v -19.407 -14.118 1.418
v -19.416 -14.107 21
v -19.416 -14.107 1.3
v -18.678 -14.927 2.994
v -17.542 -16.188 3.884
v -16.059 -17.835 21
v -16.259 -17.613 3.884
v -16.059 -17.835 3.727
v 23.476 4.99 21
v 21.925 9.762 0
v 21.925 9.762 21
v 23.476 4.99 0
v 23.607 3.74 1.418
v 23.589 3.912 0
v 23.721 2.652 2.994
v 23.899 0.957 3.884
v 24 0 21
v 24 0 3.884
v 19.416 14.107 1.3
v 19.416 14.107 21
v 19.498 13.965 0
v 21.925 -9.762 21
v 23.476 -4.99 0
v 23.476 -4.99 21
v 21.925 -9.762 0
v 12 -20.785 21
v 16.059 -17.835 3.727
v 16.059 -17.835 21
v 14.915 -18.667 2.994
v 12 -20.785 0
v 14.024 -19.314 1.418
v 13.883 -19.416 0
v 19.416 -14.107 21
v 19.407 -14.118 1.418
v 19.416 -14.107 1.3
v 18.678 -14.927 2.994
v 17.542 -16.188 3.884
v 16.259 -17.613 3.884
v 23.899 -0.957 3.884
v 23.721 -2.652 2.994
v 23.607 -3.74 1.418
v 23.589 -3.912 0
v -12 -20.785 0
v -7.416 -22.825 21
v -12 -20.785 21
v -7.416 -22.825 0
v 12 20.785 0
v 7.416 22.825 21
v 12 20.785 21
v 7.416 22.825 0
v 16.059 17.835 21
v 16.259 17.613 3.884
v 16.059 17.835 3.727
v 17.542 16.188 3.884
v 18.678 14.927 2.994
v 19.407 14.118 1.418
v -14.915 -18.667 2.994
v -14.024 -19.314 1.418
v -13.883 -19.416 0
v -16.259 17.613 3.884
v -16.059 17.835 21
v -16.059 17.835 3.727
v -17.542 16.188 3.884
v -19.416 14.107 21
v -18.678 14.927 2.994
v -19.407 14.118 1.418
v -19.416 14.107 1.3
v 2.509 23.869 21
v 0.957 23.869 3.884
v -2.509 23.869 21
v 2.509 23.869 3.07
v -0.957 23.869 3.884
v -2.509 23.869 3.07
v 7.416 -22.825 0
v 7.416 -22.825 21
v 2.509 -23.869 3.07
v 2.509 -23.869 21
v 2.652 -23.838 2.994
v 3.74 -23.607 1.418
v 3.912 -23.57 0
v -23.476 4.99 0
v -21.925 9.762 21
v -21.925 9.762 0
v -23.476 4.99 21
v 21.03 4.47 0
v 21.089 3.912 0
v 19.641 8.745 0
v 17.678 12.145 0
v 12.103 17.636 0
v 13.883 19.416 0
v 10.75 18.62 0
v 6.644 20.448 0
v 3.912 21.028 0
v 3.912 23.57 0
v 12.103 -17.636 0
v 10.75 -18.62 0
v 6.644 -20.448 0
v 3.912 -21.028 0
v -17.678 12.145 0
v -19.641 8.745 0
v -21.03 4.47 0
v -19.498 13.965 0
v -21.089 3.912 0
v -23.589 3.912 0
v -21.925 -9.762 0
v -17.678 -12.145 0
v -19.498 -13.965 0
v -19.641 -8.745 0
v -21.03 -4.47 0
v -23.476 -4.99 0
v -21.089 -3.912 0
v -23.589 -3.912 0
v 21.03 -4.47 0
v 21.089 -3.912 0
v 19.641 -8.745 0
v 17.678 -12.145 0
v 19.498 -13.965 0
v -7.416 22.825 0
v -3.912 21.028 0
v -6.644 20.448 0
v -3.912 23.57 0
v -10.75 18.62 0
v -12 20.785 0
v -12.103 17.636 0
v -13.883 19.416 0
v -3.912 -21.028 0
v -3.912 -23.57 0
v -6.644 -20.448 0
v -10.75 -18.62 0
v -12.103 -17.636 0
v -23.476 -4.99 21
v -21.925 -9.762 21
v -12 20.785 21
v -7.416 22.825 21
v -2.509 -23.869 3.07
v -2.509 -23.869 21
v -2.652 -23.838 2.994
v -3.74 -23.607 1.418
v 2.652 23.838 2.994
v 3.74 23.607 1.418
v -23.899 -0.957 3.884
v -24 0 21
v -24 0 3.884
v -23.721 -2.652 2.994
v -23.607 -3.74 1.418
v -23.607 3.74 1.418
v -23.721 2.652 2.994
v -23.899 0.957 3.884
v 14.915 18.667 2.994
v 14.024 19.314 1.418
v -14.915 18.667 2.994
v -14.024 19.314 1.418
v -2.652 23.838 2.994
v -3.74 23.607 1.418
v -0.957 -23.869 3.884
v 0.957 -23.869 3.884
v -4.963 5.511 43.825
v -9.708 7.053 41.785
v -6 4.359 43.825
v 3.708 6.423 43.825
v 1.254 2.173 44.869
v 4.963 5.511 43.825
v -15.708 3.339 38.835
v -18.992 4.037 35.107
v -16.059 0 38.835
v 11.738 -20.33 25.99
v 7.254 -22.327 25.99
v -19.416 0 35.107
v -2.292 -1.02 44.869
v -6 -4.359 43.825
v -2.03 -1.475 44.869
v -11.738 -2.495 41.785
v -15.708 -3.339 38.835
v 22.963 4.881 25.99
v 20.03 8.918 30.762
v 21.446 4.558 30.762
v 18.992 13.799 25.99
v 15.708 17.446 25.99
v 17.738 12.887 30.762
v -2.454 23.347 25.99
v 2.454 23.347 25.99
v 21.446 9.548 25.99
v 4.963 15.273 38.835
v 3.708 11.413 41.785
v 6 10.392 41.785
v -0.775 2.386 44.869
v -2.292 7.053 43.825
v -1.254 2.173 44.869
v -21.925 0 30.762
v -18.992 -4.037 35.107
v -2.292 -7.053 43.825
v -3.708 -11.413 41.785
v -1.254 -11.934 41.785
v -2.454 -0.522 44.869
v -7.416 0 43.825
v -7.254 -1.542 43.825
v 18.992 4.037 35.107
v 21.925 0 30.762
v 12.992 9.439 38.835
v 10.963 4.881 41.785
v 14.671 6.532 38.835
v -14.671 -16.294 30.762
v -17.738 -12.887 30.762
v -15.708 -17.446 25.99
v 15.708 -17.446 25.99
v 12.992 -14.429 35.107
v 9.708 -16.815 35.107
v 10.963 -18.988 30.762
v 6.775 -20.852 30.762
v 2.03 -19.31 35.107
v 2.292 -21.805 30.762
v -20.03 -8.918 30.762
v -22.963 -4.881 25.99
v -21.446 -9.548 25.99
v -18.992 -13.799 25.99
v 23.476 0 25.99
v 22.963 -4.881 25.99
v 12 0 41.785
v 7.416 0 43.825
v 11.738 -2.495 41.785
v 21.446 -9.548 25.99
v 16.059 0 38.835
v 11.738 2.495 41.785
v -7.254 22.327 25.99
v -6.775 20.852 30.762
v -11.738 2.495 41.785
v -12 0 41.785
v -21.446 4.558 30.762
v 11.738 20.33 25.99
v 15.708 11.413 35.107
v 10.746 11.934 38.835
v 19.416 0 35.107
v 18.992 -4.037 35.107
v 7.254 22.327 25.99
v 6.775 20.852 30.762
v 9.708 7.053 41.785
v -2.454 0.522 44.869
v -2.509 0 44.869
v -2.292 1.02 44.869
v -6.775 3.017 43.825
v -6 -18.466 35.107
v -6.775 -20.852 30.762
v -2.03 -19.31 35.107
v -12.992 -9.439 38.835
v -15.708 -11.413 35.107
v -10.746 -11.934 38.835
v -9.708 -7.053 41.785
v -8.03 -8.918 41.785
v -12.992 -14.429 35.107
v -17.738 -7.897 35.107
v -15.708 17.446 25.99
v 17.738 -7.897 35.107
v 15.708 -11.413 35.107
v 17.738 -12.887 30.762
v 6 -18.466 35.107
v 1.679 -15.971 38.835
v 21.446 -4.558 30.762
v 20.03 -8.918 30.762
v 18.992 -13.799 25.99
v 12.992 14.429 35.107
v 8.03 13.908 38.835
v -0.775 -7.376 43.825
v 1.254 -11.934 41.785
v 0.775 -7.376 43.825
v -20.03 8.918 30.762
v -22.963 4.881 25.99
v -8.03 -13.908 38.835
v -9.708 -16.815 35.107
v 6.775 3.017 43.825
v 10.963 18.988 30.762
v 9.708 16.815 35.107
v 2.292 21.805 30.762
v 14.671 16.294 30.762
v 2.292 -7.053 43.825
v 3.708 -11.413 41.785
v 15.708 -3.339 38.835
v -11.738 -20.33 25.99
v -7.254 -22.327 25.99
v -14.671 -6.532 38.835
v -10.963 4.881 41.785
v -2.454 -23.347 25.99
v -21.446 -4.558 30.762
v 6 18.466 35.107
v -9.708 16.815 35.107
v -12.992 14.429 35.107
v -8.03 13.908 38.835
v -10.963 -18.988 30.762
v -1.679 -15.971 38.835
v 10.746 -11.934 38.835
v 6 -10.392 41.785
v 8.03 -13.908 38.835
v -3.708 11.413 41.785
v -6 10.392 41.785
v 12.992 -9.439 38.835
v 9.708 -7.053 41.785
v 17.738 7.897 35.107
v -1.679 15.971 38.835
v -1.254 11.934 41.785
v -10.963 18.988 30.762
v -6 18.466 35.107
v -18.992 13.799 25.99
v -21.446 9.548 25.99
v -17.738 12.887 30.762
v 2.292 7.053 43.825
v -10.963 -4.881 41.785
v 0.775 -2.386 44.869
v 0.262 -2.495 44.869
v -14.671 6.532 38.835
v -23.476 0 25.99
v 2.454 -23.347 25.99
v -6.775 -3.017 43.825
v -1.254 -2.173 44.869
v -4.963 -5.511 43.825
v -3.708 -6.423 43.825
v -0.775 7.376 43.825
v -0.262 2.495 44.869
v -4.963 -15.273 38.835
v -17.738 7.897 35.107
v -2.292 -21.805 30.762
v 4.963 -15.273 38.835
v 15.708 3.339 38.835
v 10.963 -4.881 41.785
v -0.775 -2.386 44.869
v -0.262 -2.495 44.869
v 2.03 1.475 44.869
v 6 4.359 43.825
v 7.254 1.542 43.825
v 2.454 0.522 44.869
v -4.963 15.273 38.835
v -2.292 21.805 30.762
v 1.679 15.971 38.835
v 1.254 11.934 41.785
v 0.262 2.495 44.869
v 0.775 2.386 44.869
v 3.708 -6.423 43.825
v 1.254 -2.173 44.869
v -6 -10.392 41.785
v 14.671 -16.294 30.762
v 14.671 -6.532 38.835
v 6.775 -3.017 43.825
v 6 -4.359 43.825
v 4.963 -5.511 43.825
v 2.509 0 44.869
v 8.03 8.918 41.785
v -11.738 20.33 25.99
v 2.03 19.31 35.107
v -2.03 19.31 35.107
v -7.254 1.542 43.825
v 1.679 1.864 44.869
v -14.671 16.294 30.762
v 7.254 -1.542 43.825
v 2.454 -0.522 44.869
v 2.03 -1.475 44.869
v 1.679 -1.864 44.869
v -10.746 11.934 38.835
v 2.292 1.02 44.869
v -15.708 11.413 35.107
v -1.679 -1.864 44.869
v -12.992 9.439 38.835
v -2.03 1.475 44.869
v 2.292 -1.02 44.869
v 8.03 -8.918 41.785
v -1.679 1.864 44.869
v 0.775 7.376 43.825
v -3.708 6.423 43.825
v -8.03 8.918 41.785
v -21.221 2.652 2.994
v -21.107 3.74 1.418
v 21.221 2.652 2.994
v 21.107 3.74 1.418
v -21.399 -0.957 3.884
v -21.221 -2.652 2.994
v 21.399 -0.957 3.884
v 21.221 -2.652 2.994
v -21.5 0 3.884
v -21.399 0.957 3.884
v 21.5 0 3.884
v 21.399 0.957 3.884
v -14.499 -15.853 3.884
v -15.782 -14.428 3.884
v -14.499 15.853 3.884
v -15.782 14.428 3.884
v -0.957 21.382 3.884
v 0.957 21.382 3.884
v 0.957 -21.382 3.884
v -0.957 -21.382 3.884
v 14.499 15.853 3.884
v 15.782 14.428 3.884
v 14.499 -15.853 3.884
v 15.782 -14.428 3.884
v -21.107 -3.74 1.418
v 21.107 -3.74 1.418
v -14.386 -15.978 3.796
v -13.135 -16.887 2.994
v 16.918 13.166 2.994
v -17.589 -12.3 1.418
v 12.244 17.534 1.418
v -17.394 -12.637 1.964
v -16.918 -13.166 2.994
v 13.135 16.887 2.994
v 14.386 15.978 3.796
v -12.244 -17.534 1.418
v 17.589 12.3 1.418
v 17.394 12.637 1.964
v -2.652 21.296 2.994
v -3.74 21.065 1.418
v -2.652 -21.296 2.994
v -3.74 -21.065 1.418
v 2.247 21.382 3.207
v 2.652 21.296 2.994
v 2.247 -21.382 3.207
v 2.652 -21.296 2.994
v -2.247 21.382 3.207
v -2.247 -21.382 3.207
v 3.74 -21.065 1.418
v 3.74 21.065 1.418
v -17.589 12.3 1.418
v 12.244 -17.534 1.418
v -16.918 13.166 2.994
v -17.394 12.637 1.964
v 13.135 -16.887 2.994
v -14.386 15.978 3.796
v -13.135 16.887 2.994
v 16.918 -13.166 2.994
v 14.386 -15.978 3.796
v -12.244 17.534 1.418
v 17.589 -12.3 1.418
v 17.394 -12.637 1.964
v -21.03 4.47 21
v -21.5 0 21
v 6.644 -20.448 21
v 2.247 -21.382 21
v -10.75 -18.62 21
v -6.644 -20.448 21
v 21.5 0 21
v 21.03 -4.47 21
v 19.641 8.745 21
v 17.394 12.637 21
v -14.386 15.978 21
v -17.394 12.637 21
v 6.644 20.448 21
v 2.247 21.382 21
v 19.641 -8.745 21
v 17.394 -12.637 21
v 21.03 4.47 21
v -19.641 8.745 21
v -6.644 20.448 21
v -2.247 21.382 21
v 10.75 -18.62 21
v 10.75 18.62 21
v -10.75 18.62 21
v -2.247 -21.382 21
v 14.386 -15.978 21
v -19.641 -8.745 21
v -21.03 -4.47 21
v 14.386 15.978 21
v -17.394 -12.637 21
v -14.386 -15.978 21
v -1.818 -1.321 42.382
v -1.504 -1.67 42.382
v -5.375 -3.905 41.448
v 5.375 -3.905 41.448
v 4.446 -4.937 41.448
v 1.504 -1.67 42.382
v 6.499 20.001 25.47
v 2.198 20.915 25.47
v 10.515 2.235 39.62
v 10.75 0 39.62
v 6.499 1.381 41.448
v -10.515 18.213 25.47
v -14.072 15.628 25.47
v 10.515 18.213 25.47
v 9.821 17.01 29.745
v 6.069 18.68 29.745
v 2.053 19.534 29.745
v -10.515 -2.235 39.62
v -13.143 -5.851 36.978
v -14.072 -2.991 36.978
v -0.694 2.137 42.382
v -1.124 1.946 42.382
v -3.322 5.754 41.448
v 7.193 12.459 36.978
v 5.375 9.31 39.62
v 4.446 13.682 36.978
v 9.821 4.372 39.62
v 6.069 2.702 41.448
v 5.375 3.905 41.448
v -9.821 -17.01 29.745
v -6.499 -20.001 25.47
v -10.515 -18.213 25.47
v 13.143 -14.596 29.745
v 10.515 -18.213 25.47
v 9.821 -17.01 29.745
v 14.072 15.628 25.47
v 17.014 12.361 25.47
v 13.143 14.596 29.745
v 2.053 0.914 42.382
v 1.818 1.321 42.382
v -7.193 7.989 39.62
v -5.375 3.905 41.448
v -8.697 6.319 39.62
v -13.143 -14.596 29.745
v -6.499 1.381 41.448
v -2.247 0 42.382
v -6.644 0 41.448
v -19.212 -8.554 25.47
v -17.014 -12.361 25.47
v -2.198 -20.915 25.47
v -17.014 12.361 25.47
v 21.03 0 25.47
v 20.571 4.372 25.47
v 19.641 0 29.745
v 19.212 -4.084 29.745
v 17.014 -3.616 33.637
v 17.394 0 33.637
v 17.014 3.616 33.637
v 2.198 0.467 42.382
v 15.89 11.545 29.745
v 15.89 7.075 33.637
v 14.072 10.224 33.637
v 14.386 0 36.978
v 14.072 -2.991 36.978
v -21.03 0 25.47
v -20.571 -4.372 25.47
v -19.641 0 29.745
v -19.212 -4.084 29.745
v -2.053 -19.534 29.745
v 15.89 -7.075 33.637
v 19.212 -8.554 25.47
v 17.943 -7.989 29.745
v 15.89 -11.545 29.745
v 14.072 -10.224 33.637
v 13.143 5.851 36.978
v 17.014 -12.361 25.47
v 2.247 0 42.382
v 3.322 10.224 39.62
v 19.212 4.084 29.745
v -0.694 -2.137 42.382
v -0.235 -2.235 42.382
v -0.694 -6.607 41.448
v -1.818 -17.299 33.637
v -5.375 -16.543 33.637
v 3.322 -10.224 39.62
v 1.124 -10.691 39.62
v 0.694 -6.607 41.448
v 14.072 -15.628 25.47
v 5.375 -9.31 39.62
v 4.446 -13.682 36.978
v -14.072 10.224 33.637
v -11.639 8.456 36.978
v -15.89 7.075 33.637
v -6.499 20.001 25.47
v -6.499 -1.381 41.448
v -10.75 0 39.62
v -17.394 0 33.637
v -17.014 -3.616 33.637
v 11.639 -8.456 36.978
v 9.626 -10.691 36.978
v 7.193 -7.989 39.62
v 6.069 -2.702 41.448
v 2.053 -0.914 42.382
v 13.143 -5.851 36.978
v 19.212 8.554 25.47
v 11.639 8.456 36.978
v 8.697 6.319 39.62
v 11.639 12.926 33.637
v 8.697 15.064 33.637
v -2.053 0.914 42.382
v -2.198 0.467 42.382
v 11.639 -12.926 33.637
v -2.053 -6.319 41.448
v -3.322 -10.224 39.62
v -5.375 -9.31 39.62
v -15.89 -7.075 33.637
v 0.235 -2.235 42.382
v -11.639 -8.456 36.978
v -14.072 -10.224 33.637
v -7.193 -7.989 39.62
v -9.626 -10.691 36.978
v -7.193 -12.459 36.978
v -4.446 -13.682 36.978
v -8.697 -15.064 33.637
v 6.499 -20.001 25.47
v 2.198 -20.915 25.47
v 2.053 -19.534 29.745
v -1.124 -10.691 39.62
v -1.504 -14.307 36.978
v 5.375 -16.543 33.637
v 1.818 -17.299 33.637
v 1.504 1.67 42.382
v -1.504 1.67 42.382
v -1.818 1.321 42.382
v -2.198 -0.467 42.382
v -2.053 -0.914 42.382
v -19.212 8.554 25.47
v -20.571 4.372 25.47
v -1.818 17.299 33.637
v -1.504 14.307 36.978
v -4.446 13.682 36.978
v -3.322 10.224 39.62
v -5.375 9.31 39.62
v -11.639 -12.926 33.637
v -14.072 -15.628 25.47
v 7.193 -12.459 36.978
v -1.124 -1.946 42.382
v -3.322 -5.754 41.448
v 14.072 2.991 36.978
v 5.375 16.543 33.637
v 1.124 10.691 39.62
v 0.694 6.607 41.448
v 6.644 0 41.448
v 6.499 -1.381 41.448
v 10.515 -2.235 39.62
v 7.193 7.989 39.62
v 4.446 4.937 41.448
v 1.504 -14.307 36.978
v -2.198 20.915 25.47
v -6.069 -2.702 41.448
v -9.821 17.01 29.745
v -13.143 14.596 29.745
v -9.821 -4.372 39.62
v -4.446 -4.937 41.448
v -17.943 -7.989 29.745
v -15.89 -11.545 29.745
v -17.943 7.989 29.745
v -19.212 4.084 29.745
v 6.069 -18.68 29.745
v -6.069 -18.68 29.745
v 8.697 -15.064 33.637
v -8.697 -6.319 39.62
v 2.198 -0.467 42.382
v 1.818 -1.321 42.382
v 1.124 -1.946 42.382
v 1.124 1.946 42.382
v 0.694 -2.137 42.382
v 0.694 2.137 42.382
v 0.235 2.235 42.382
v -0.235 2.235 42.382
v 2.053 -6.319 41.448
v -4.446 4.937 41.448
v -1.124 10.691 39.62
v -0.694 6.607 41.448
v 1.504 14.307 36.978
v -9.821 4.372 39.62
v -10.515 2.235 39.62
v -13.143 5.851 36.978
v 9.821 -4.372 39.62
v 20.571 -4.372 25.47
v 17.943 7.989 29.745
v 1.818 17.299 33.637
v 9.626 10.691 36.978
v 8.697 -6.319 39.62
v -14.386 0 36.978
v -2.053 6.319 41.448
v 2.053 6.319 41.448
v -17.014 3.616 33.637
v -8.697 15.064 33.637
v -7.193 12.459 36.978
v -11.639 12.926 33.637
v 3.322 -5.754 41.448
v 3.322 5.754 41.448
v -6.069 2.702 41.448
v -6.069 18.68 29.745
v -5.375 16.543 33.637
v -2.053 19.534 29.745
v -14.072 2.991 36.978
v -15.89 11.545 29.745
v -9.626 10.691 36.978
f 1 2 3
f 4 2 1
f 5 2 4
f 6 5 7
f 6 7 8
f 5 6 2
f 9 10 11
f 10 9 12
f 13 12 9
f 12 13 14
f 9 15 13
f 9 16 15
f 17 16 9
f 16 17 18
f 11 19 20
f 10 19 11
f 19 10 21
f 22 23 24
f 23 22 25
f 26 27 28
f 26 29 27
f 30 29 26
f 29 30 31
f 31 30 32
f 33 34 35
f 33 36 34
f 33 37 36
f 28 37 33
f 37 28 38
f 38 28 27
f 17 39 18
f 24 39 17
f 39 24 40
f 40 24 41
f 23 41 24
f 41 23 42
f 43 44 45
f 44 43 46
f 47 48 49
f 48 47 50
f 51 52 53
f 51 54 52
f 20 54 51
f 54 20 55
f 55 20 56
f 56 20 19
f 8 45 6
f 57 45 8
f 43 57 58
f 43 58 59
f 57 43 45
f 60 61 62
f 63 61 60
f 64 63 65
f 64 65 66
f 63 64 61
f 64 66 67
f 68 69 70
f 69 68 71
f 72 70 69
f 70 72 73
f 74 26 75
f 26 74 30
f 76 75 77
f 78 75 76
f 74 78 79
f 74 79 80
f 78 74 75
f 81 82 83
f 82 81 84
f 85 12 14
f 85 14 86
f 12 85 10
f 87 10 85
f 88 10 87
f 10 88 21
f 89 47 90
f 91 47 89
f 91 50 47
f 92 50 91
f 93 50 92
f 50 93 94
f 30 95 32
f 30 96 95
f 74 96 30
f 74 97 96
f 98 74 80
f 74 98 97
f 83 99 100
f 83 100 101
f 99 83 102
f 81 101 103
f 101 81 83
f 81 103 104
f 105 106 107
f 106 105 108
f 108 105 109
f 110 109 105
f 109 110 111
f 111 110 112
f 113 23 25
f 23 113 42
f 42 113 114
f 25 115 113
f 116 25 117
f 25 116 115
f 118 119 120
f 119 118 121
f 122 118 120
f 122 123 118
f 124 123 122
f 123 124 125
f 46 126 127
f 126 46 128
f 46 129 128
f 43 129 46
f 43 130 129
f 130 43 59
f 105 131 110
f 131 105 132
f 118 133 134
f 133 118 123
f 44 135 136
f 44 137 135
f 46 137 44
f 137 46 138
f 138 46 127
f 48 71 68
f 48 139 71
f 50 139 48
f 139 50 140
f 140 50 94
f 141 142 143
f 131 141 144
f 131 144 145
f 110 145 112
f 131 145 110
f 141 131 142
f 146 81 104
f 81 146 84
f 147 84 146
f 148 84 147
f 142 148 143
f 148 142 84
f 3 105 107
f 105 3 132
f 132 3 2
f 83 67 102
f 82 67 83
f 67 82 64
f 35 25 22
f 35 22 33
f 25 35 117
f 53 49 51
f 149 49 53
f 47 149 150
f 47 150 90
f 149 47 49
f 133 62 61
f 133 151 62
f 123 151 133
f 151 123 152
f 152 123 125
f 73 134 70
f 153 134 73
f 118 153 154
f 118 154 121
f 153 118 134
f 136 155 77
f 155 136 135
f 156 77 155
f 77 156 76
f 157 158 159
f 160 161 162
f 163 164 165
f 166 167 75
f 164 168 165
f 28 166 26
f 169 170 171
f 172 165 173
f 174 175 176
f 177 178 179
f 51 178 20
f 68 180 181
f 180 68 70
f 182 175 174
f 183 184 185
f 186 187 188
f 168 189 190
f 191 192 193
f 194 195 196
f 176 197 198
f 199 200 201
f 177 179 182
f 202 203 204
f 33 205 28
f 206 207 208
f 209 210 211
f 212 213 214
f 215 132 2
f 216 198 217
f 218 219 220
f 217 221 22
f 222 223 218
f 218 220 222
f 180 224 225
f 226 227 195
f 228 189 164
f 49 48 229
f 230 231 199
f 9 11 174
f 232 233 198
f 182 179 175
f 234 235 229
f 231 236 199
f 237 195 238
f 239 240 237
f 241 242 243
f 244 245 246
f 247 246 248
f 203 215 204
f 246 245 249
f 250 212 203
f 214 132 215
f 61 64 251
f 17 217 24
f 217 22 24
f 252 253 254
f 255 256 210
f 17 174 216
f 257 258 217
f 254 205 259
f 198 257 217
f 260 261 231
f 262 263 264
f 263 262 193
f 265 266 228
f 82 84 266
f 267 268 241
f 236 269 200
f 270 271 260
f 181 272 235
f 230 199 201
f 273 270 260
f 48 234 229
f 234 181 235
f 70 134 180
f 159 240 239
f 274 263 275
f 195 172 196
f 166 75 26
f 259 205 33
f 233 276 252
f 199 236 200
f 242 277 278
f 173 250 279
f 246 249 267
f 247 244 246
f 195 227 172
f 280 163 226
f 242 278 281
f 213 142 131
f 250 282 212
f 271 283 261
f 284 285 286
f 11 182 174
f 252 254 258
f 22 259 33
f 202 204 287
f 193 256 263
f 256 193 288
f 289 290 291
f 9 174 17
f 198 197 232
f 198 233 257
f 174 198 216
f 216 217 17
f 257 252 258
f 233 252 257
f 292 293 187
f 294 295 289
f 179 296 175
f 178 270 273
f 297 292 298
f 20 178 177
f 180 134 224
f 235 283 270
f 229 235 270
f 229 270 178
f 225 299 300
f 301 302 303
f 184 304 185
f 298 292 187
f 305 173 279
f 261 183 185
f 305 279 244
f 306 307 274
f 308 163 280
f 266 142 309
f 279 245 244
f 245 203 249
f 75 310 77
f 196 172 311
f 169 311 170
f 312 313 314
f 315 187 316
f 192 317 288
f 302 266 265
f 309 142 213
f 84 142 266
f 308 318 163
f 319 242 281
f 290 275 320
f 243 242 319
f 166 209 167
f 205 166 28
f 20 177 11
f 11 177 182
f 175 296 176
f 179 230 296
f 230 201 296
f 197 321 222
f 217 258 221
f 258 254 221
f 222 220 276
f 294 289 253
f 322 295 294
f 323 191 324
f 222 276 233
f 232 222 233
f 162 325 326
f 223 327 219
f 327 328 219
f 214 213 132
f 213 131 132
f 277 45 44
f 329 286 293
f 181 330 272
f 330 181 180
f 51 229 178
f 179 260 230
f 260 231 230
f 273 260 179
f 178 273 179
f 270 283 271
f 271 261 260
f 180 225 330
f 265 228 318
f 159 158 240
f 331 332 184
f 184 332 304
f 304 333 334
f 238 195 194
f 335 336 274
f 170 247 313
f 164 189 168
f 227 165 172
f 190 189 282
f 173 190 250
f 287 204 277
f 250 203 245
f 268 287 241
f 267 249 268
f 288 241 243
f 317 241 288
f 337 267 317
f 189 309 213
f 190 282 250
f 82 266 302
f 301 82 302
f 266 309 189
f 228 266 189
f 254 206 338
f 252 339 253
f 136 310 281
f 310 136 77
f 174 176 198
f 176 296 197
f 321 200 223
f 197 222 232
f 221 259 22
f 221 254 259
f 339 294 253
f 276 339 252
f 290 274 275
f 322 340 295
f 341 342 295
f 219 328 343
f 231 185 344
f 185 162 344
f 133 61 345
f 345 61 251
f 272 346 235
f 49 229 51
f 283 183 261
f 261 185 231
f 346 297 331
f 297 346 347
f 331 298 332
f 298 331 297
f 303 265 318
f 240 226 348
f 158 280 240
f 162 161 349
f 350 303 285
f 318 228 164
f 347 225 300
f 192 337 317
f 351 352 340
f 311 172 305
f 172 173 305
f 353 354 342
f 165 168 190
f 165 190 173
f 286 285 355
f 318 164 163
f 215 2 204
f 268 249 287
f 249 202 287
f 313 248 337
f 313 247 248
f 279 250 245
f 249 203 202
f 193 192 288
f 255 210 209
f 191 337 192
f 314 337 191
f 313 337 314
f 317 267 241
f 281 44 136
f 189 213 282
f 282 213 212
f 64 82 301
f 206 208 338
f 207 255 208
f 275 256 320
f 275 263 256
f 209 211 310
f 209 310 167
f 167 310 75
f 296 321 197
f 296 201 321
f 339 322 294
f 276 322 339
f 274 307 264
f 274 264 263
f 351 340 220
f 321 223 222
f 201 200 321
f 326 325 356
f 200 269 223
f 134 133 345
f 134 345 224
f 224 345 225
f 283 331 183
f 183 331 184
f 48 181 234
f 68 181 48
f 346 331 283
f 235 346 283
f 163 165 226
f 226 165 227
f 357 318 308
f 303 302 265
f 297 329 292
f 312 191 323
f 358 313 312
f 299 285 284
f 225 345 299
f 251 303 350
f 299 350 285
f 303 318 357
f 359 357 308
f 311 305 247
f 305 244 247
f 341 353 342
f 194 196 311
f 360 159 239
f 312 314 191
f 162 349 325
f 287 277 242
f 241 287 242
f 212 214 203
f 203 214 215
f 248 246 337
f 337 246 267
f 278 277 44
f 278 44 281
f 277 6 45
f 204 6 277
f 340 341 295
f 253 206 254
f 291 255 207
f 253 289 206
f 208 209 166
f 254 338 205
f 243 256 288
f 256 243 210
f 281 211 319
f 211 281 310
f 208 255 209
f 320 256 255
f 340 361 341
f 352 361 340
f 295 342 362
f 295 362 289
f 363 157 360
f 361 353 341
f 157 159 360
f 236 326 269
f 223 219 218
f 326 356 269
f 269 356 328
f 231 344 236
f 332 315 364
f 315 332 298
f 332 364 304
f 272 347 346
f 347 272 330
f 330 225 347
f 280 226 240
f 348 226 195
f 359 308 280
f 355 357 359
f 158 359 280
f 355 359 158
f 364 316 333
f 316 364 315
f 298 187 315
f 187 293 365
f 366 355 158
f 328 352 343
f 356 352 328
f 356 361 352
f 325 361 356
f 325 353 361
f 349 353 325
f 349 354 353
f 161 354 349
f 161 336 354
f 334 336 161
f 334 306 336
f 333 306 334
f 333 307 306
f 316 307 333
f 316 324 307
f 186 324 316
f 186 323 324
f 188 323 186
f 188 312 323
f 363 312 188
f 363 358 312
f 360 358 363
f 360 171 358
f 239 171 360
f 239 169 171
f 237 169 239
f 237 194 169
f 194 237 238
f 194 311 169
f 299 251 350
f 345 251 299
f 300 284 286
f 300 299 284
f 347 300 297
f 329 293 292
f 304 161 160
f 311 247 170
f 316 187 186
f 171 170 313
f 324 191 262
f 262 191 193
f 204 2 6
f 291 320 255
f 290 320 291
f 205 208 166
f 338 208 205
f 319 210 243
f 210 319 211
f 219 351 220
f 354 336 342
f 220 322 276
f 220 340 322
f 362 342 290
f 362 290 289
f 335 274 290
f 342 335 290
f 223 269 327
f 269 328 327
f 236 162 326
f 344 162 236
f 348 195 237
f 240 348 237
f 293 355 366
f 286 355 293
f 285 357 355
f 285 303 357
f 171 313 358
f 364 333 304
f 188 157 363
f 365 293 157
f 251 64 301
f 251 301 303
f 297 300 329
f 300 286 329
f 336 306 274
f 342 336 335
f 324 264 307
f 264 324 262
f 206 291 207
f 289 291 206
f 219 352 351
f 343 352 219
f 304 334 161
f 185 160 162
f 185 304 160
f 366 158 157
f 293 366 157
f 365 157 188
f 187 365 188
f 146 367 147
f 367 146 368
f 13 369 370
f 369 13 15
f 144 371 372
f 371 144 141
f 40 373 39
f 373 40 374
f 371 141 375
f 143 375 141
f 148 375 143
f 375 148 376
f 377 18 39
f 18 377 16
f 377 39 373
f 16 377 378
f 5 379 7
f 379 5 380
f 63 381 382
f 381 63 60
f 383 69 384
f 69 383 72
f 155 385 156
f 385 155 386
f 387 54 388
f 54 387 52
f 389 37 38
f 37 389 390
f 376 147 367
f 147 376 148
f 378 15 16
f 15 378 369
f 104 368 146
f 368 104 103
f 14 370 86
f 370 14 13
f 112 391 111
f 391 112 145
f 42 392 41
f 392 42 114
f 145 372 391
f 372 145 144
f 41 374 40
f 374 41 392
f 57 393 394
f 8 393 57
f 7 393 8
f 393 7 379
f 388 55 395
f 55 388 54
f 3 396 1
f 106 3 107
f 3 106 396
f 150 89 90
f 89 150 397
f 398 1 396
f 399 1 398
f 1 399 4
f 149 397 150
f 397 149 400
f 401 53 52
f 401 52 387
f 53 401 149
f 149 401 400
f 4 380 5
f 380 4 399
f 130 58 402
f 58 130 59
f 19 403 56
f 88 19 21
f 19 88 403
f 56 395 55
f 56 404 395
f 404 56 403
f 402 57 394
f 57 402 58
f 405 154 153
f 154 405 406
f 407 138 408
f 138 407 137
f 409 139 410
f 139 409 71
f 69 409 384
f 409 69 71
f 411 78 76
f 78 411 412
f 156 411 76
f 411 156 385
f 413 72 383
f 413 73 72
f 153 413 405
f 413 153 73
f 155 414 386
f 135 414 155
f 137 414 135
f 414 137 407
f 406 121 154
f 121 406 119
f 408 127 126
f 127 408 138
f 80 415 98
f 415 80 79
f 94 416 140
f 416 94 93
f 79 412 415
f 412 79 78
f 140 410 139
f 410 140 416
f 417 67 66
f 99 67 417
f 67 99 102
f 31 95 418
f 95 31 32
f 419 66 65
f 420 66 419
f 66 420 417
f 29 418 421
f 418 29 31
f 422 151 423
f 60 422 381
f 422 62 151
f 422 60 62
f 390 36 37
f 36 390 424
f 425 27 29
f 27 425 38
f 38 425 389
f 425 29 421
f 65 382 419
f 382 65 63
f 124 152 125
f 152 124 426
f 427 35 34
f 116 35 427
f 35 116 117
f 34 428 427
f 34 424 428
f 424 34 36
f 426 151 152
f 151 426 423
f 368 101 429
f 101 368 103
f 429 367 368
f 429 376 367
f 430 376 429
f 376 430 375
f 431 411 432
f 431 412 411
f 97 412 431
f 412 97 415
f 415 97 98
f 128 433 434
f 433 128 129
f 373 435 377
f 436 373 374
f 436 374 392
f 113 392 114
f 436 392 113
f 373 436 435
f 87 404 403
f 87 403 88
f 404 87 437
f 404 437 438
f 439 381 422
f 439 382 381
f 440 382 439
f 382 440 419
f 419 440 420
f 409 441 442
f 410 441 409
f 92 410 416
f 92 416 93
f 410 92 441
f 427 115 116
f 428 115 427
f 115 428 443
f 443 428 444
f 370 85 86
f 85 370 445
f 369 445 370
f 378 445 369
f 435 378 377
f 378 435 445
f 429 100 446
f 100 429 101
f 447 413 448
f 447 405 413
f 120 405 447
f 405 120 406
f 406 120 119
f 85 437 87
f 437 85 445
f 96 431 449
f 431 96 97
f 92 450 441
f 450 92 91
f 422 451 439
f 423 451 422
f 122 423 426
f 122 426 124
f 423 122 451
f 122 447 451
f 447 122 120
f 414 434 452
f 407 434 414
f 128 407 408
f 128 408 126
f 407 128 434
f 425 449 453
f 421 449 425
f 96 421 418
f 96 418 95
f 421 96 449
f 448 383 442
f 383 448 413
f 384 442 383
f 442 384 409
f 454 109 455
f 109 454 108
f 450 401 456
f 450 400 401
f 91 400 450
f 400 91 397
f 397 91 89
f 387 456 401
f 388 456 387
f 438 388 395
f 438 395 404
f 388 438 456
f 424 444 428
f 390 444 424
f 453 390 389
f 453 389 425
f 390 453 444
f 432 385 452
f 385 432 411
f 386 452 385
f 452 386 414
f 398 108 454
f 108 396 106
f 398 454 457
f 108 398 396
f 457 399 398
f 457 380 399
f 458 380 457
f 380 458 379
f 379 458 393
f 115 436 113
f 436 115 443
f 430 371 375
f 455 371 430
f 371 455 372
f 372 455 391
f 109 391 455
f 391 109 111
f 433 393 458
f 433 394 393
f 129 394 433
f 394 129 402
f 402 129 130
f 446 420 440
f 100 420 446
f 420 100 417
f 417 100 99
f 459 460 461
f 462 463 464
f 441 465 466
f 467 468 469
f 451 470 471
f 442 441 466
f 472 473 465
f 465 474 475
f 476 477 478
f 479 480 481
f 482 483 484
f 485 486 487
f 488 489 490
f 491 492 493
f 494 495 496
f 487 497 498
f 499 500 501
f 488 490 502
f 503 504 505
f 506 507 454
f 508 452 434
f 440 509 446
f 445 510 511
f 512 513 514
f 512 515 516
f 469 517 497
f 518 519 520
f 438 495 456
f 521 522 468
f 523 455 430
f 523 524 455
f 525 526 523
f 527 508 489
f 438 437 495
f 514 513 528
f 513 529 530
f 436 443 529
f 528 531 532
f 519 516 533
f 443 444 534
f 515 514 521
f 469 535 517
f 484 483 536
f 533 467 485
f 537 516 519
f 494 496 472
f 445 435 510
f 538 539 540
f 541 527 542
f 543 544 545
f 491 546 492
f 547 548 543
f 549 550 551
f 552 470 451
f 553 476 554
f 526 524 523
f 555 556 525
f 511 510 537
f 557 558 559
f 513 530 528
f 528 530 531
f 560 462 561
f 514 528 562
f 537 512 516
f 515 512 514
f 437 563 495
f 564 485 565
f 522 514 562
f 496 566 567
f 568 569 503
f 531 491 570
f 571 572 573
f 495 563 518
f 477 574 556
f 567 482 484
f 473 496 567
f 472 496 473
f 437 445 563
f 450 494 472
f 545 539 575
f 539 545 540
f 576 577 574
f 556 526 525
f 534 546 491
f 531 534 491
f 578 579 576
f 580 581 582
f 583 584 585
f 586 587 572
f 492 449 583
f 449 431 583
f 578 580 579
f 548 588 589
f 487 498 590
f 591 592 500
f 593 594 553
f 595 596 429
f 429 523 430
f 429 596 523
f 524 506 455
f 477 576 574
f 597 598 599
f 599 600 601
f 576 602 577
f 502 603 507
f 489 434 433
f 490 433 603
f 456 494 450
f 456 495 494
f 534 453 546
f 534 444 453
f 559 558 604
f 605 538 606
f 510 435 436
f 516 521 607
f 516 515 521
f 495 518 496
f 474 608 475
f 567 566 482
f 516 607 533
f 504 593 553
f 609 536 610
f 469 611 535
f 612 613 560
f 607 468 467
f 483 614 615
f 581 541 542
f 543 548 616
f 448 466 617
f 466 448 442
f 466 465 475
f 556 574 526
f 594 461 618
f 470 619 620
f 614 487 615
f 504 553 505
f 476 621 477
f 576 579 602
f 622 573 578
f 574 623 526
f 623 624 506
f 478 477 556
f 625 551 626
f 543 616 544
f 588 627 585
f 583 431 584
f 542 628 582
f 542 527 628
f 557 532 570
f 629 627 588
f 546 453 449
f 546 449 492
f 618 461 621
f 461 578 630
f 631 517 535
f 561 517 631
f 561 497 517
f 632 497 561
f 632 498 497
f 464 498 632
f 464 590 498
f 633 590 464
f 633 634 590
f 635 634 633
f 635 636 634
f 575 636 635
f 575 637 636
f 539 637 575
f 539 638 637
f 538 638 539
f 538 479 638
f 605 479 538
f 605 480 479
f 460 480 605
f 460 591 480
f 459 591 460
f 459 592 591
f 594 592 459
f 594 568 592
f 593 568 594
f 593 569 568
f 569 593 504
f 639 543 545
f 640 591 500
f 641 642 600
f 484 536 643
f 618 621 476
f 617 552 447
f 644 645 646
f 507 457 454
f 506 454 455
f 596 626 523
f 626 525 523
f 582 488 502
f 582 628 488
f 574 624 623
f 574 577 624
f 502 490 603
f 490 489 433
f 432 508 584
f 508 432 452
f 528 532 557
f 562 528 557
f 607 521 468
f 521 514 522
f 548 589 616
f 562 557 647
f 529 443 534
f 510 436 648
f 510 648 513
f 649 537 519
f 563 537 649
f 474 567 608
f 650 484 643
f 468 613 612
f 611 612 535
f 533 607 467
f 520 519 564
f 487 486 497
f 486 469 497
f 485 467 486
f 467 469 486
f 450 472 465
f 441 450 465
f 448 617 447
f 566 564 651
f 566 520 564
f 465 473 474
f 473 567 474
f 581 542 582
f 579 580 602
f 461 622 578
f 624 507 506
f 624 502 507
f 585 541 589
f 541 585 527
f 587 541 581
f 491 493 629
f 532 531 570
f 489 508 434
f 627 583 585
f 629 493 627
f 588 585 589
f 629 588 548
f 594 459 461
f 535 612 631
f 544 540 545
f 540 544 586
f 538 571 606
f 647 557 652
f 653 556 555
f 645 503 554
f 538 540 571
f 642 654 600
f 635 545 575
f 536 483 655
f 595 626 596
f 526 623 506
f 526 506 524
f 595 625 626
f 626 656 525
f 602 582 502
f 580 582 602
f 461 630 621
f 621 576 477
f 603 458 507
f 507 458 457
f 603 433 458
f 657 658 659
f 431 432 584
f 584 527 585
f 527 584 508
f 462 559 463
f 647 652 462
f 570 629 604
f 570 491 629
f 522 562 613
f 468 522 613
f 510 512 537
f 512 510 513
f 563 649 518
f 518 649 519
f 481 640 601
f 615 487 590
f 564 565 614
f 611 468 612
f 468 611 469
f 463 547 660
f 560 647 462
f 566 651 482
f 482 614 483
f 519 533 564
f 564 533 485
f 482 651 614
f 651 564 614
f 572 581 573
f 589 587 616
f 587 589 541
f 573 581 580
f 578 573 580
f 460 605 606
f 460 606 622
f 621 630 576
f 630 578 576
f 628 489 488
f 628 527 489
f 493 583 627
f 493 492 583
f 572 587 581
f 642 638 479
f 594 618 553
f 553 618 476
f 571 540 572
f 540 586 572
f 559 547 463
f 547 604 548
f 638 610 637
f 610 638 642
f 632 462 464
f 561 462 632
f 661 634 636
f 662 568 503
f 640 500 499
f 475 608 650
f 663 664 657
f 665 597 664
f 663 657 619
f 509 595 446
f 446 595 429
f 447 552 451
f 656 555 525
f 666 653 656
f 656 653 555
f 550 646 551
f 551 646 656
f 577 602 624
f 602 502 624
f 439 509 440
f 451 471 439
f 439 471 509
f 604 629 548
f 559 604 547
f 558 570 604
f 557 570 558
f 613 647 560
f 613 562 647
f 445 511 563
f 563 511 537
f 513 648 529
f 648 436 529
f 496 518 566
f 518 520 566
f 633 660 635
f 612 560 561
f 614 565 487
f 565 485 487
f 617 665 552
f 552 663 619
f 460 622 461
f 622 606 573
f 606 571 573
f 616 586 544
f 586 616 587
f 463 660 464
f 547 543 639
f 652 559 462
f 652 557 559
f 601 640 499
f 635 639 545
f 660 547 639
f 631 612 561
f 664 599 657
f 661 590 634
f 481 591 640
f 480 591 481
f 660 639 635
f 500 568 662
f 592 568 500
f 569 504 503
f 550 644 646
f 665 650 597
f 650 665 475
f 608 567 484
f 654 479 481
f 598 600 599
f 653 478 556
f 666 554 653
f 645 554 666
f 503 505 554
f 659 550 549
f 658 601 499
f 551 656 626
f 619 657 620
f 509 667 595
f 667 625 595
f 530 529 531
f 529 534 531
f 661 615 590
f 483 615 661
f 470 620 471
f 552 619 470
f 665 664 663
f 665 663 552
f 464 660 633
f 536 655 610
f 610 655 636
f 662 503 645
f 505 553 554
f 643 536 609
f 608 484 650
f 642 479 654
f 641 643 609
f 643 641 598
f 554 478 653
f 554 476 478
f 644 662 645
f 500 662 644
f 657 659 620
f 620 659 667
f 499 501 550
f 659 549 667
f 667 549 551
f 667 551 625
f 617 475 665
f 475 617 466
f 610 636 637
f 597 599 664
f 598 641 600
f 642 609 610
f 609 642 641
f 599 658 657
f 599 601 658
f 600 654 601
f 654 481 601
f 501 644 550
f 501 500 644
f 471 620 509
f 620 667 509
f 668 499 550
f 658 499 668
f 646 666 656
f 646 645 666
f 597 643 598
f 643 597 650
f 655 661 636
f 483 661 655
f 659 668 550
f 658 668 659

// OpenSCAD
// A Hydroponic syphon

length=45;
main_dia= 48;
walls = 2.5;
inlets_dia=8;

body_length = length-main_dia/2;
center_hole_dia = main_dia-(walls*2);
  

module body() {
	union () {		

		cylinder(h=body_length,d=main_dia,center=false);
		translate ([0,0,body_length])  sphere(d=main_dia);
	}
}

module holes() {
	height = main_dia/2;
	union () {	
		cylinder(h=body_length,d=center_hole_dia,center=false);
		translate([0,0,body_length])  sphere(d=center_hole_dia);
		
		translate([0,0,-height/2]) cube(size=[main_dia,main_dia,height],center=true);

		//inlets
		for (a =[0:8])
		{
			rotate([0,90,360/8*a]) cylinder(h=main_dia*2,d=inlets_dia,center=true);
		}
		
	}
}

difference () {
	body();
	holes();
	
	//for testing only
	//cube([100,100,27],center=true);
	//translate([0,0,43]) cube([100,100,35],center=true);
}
